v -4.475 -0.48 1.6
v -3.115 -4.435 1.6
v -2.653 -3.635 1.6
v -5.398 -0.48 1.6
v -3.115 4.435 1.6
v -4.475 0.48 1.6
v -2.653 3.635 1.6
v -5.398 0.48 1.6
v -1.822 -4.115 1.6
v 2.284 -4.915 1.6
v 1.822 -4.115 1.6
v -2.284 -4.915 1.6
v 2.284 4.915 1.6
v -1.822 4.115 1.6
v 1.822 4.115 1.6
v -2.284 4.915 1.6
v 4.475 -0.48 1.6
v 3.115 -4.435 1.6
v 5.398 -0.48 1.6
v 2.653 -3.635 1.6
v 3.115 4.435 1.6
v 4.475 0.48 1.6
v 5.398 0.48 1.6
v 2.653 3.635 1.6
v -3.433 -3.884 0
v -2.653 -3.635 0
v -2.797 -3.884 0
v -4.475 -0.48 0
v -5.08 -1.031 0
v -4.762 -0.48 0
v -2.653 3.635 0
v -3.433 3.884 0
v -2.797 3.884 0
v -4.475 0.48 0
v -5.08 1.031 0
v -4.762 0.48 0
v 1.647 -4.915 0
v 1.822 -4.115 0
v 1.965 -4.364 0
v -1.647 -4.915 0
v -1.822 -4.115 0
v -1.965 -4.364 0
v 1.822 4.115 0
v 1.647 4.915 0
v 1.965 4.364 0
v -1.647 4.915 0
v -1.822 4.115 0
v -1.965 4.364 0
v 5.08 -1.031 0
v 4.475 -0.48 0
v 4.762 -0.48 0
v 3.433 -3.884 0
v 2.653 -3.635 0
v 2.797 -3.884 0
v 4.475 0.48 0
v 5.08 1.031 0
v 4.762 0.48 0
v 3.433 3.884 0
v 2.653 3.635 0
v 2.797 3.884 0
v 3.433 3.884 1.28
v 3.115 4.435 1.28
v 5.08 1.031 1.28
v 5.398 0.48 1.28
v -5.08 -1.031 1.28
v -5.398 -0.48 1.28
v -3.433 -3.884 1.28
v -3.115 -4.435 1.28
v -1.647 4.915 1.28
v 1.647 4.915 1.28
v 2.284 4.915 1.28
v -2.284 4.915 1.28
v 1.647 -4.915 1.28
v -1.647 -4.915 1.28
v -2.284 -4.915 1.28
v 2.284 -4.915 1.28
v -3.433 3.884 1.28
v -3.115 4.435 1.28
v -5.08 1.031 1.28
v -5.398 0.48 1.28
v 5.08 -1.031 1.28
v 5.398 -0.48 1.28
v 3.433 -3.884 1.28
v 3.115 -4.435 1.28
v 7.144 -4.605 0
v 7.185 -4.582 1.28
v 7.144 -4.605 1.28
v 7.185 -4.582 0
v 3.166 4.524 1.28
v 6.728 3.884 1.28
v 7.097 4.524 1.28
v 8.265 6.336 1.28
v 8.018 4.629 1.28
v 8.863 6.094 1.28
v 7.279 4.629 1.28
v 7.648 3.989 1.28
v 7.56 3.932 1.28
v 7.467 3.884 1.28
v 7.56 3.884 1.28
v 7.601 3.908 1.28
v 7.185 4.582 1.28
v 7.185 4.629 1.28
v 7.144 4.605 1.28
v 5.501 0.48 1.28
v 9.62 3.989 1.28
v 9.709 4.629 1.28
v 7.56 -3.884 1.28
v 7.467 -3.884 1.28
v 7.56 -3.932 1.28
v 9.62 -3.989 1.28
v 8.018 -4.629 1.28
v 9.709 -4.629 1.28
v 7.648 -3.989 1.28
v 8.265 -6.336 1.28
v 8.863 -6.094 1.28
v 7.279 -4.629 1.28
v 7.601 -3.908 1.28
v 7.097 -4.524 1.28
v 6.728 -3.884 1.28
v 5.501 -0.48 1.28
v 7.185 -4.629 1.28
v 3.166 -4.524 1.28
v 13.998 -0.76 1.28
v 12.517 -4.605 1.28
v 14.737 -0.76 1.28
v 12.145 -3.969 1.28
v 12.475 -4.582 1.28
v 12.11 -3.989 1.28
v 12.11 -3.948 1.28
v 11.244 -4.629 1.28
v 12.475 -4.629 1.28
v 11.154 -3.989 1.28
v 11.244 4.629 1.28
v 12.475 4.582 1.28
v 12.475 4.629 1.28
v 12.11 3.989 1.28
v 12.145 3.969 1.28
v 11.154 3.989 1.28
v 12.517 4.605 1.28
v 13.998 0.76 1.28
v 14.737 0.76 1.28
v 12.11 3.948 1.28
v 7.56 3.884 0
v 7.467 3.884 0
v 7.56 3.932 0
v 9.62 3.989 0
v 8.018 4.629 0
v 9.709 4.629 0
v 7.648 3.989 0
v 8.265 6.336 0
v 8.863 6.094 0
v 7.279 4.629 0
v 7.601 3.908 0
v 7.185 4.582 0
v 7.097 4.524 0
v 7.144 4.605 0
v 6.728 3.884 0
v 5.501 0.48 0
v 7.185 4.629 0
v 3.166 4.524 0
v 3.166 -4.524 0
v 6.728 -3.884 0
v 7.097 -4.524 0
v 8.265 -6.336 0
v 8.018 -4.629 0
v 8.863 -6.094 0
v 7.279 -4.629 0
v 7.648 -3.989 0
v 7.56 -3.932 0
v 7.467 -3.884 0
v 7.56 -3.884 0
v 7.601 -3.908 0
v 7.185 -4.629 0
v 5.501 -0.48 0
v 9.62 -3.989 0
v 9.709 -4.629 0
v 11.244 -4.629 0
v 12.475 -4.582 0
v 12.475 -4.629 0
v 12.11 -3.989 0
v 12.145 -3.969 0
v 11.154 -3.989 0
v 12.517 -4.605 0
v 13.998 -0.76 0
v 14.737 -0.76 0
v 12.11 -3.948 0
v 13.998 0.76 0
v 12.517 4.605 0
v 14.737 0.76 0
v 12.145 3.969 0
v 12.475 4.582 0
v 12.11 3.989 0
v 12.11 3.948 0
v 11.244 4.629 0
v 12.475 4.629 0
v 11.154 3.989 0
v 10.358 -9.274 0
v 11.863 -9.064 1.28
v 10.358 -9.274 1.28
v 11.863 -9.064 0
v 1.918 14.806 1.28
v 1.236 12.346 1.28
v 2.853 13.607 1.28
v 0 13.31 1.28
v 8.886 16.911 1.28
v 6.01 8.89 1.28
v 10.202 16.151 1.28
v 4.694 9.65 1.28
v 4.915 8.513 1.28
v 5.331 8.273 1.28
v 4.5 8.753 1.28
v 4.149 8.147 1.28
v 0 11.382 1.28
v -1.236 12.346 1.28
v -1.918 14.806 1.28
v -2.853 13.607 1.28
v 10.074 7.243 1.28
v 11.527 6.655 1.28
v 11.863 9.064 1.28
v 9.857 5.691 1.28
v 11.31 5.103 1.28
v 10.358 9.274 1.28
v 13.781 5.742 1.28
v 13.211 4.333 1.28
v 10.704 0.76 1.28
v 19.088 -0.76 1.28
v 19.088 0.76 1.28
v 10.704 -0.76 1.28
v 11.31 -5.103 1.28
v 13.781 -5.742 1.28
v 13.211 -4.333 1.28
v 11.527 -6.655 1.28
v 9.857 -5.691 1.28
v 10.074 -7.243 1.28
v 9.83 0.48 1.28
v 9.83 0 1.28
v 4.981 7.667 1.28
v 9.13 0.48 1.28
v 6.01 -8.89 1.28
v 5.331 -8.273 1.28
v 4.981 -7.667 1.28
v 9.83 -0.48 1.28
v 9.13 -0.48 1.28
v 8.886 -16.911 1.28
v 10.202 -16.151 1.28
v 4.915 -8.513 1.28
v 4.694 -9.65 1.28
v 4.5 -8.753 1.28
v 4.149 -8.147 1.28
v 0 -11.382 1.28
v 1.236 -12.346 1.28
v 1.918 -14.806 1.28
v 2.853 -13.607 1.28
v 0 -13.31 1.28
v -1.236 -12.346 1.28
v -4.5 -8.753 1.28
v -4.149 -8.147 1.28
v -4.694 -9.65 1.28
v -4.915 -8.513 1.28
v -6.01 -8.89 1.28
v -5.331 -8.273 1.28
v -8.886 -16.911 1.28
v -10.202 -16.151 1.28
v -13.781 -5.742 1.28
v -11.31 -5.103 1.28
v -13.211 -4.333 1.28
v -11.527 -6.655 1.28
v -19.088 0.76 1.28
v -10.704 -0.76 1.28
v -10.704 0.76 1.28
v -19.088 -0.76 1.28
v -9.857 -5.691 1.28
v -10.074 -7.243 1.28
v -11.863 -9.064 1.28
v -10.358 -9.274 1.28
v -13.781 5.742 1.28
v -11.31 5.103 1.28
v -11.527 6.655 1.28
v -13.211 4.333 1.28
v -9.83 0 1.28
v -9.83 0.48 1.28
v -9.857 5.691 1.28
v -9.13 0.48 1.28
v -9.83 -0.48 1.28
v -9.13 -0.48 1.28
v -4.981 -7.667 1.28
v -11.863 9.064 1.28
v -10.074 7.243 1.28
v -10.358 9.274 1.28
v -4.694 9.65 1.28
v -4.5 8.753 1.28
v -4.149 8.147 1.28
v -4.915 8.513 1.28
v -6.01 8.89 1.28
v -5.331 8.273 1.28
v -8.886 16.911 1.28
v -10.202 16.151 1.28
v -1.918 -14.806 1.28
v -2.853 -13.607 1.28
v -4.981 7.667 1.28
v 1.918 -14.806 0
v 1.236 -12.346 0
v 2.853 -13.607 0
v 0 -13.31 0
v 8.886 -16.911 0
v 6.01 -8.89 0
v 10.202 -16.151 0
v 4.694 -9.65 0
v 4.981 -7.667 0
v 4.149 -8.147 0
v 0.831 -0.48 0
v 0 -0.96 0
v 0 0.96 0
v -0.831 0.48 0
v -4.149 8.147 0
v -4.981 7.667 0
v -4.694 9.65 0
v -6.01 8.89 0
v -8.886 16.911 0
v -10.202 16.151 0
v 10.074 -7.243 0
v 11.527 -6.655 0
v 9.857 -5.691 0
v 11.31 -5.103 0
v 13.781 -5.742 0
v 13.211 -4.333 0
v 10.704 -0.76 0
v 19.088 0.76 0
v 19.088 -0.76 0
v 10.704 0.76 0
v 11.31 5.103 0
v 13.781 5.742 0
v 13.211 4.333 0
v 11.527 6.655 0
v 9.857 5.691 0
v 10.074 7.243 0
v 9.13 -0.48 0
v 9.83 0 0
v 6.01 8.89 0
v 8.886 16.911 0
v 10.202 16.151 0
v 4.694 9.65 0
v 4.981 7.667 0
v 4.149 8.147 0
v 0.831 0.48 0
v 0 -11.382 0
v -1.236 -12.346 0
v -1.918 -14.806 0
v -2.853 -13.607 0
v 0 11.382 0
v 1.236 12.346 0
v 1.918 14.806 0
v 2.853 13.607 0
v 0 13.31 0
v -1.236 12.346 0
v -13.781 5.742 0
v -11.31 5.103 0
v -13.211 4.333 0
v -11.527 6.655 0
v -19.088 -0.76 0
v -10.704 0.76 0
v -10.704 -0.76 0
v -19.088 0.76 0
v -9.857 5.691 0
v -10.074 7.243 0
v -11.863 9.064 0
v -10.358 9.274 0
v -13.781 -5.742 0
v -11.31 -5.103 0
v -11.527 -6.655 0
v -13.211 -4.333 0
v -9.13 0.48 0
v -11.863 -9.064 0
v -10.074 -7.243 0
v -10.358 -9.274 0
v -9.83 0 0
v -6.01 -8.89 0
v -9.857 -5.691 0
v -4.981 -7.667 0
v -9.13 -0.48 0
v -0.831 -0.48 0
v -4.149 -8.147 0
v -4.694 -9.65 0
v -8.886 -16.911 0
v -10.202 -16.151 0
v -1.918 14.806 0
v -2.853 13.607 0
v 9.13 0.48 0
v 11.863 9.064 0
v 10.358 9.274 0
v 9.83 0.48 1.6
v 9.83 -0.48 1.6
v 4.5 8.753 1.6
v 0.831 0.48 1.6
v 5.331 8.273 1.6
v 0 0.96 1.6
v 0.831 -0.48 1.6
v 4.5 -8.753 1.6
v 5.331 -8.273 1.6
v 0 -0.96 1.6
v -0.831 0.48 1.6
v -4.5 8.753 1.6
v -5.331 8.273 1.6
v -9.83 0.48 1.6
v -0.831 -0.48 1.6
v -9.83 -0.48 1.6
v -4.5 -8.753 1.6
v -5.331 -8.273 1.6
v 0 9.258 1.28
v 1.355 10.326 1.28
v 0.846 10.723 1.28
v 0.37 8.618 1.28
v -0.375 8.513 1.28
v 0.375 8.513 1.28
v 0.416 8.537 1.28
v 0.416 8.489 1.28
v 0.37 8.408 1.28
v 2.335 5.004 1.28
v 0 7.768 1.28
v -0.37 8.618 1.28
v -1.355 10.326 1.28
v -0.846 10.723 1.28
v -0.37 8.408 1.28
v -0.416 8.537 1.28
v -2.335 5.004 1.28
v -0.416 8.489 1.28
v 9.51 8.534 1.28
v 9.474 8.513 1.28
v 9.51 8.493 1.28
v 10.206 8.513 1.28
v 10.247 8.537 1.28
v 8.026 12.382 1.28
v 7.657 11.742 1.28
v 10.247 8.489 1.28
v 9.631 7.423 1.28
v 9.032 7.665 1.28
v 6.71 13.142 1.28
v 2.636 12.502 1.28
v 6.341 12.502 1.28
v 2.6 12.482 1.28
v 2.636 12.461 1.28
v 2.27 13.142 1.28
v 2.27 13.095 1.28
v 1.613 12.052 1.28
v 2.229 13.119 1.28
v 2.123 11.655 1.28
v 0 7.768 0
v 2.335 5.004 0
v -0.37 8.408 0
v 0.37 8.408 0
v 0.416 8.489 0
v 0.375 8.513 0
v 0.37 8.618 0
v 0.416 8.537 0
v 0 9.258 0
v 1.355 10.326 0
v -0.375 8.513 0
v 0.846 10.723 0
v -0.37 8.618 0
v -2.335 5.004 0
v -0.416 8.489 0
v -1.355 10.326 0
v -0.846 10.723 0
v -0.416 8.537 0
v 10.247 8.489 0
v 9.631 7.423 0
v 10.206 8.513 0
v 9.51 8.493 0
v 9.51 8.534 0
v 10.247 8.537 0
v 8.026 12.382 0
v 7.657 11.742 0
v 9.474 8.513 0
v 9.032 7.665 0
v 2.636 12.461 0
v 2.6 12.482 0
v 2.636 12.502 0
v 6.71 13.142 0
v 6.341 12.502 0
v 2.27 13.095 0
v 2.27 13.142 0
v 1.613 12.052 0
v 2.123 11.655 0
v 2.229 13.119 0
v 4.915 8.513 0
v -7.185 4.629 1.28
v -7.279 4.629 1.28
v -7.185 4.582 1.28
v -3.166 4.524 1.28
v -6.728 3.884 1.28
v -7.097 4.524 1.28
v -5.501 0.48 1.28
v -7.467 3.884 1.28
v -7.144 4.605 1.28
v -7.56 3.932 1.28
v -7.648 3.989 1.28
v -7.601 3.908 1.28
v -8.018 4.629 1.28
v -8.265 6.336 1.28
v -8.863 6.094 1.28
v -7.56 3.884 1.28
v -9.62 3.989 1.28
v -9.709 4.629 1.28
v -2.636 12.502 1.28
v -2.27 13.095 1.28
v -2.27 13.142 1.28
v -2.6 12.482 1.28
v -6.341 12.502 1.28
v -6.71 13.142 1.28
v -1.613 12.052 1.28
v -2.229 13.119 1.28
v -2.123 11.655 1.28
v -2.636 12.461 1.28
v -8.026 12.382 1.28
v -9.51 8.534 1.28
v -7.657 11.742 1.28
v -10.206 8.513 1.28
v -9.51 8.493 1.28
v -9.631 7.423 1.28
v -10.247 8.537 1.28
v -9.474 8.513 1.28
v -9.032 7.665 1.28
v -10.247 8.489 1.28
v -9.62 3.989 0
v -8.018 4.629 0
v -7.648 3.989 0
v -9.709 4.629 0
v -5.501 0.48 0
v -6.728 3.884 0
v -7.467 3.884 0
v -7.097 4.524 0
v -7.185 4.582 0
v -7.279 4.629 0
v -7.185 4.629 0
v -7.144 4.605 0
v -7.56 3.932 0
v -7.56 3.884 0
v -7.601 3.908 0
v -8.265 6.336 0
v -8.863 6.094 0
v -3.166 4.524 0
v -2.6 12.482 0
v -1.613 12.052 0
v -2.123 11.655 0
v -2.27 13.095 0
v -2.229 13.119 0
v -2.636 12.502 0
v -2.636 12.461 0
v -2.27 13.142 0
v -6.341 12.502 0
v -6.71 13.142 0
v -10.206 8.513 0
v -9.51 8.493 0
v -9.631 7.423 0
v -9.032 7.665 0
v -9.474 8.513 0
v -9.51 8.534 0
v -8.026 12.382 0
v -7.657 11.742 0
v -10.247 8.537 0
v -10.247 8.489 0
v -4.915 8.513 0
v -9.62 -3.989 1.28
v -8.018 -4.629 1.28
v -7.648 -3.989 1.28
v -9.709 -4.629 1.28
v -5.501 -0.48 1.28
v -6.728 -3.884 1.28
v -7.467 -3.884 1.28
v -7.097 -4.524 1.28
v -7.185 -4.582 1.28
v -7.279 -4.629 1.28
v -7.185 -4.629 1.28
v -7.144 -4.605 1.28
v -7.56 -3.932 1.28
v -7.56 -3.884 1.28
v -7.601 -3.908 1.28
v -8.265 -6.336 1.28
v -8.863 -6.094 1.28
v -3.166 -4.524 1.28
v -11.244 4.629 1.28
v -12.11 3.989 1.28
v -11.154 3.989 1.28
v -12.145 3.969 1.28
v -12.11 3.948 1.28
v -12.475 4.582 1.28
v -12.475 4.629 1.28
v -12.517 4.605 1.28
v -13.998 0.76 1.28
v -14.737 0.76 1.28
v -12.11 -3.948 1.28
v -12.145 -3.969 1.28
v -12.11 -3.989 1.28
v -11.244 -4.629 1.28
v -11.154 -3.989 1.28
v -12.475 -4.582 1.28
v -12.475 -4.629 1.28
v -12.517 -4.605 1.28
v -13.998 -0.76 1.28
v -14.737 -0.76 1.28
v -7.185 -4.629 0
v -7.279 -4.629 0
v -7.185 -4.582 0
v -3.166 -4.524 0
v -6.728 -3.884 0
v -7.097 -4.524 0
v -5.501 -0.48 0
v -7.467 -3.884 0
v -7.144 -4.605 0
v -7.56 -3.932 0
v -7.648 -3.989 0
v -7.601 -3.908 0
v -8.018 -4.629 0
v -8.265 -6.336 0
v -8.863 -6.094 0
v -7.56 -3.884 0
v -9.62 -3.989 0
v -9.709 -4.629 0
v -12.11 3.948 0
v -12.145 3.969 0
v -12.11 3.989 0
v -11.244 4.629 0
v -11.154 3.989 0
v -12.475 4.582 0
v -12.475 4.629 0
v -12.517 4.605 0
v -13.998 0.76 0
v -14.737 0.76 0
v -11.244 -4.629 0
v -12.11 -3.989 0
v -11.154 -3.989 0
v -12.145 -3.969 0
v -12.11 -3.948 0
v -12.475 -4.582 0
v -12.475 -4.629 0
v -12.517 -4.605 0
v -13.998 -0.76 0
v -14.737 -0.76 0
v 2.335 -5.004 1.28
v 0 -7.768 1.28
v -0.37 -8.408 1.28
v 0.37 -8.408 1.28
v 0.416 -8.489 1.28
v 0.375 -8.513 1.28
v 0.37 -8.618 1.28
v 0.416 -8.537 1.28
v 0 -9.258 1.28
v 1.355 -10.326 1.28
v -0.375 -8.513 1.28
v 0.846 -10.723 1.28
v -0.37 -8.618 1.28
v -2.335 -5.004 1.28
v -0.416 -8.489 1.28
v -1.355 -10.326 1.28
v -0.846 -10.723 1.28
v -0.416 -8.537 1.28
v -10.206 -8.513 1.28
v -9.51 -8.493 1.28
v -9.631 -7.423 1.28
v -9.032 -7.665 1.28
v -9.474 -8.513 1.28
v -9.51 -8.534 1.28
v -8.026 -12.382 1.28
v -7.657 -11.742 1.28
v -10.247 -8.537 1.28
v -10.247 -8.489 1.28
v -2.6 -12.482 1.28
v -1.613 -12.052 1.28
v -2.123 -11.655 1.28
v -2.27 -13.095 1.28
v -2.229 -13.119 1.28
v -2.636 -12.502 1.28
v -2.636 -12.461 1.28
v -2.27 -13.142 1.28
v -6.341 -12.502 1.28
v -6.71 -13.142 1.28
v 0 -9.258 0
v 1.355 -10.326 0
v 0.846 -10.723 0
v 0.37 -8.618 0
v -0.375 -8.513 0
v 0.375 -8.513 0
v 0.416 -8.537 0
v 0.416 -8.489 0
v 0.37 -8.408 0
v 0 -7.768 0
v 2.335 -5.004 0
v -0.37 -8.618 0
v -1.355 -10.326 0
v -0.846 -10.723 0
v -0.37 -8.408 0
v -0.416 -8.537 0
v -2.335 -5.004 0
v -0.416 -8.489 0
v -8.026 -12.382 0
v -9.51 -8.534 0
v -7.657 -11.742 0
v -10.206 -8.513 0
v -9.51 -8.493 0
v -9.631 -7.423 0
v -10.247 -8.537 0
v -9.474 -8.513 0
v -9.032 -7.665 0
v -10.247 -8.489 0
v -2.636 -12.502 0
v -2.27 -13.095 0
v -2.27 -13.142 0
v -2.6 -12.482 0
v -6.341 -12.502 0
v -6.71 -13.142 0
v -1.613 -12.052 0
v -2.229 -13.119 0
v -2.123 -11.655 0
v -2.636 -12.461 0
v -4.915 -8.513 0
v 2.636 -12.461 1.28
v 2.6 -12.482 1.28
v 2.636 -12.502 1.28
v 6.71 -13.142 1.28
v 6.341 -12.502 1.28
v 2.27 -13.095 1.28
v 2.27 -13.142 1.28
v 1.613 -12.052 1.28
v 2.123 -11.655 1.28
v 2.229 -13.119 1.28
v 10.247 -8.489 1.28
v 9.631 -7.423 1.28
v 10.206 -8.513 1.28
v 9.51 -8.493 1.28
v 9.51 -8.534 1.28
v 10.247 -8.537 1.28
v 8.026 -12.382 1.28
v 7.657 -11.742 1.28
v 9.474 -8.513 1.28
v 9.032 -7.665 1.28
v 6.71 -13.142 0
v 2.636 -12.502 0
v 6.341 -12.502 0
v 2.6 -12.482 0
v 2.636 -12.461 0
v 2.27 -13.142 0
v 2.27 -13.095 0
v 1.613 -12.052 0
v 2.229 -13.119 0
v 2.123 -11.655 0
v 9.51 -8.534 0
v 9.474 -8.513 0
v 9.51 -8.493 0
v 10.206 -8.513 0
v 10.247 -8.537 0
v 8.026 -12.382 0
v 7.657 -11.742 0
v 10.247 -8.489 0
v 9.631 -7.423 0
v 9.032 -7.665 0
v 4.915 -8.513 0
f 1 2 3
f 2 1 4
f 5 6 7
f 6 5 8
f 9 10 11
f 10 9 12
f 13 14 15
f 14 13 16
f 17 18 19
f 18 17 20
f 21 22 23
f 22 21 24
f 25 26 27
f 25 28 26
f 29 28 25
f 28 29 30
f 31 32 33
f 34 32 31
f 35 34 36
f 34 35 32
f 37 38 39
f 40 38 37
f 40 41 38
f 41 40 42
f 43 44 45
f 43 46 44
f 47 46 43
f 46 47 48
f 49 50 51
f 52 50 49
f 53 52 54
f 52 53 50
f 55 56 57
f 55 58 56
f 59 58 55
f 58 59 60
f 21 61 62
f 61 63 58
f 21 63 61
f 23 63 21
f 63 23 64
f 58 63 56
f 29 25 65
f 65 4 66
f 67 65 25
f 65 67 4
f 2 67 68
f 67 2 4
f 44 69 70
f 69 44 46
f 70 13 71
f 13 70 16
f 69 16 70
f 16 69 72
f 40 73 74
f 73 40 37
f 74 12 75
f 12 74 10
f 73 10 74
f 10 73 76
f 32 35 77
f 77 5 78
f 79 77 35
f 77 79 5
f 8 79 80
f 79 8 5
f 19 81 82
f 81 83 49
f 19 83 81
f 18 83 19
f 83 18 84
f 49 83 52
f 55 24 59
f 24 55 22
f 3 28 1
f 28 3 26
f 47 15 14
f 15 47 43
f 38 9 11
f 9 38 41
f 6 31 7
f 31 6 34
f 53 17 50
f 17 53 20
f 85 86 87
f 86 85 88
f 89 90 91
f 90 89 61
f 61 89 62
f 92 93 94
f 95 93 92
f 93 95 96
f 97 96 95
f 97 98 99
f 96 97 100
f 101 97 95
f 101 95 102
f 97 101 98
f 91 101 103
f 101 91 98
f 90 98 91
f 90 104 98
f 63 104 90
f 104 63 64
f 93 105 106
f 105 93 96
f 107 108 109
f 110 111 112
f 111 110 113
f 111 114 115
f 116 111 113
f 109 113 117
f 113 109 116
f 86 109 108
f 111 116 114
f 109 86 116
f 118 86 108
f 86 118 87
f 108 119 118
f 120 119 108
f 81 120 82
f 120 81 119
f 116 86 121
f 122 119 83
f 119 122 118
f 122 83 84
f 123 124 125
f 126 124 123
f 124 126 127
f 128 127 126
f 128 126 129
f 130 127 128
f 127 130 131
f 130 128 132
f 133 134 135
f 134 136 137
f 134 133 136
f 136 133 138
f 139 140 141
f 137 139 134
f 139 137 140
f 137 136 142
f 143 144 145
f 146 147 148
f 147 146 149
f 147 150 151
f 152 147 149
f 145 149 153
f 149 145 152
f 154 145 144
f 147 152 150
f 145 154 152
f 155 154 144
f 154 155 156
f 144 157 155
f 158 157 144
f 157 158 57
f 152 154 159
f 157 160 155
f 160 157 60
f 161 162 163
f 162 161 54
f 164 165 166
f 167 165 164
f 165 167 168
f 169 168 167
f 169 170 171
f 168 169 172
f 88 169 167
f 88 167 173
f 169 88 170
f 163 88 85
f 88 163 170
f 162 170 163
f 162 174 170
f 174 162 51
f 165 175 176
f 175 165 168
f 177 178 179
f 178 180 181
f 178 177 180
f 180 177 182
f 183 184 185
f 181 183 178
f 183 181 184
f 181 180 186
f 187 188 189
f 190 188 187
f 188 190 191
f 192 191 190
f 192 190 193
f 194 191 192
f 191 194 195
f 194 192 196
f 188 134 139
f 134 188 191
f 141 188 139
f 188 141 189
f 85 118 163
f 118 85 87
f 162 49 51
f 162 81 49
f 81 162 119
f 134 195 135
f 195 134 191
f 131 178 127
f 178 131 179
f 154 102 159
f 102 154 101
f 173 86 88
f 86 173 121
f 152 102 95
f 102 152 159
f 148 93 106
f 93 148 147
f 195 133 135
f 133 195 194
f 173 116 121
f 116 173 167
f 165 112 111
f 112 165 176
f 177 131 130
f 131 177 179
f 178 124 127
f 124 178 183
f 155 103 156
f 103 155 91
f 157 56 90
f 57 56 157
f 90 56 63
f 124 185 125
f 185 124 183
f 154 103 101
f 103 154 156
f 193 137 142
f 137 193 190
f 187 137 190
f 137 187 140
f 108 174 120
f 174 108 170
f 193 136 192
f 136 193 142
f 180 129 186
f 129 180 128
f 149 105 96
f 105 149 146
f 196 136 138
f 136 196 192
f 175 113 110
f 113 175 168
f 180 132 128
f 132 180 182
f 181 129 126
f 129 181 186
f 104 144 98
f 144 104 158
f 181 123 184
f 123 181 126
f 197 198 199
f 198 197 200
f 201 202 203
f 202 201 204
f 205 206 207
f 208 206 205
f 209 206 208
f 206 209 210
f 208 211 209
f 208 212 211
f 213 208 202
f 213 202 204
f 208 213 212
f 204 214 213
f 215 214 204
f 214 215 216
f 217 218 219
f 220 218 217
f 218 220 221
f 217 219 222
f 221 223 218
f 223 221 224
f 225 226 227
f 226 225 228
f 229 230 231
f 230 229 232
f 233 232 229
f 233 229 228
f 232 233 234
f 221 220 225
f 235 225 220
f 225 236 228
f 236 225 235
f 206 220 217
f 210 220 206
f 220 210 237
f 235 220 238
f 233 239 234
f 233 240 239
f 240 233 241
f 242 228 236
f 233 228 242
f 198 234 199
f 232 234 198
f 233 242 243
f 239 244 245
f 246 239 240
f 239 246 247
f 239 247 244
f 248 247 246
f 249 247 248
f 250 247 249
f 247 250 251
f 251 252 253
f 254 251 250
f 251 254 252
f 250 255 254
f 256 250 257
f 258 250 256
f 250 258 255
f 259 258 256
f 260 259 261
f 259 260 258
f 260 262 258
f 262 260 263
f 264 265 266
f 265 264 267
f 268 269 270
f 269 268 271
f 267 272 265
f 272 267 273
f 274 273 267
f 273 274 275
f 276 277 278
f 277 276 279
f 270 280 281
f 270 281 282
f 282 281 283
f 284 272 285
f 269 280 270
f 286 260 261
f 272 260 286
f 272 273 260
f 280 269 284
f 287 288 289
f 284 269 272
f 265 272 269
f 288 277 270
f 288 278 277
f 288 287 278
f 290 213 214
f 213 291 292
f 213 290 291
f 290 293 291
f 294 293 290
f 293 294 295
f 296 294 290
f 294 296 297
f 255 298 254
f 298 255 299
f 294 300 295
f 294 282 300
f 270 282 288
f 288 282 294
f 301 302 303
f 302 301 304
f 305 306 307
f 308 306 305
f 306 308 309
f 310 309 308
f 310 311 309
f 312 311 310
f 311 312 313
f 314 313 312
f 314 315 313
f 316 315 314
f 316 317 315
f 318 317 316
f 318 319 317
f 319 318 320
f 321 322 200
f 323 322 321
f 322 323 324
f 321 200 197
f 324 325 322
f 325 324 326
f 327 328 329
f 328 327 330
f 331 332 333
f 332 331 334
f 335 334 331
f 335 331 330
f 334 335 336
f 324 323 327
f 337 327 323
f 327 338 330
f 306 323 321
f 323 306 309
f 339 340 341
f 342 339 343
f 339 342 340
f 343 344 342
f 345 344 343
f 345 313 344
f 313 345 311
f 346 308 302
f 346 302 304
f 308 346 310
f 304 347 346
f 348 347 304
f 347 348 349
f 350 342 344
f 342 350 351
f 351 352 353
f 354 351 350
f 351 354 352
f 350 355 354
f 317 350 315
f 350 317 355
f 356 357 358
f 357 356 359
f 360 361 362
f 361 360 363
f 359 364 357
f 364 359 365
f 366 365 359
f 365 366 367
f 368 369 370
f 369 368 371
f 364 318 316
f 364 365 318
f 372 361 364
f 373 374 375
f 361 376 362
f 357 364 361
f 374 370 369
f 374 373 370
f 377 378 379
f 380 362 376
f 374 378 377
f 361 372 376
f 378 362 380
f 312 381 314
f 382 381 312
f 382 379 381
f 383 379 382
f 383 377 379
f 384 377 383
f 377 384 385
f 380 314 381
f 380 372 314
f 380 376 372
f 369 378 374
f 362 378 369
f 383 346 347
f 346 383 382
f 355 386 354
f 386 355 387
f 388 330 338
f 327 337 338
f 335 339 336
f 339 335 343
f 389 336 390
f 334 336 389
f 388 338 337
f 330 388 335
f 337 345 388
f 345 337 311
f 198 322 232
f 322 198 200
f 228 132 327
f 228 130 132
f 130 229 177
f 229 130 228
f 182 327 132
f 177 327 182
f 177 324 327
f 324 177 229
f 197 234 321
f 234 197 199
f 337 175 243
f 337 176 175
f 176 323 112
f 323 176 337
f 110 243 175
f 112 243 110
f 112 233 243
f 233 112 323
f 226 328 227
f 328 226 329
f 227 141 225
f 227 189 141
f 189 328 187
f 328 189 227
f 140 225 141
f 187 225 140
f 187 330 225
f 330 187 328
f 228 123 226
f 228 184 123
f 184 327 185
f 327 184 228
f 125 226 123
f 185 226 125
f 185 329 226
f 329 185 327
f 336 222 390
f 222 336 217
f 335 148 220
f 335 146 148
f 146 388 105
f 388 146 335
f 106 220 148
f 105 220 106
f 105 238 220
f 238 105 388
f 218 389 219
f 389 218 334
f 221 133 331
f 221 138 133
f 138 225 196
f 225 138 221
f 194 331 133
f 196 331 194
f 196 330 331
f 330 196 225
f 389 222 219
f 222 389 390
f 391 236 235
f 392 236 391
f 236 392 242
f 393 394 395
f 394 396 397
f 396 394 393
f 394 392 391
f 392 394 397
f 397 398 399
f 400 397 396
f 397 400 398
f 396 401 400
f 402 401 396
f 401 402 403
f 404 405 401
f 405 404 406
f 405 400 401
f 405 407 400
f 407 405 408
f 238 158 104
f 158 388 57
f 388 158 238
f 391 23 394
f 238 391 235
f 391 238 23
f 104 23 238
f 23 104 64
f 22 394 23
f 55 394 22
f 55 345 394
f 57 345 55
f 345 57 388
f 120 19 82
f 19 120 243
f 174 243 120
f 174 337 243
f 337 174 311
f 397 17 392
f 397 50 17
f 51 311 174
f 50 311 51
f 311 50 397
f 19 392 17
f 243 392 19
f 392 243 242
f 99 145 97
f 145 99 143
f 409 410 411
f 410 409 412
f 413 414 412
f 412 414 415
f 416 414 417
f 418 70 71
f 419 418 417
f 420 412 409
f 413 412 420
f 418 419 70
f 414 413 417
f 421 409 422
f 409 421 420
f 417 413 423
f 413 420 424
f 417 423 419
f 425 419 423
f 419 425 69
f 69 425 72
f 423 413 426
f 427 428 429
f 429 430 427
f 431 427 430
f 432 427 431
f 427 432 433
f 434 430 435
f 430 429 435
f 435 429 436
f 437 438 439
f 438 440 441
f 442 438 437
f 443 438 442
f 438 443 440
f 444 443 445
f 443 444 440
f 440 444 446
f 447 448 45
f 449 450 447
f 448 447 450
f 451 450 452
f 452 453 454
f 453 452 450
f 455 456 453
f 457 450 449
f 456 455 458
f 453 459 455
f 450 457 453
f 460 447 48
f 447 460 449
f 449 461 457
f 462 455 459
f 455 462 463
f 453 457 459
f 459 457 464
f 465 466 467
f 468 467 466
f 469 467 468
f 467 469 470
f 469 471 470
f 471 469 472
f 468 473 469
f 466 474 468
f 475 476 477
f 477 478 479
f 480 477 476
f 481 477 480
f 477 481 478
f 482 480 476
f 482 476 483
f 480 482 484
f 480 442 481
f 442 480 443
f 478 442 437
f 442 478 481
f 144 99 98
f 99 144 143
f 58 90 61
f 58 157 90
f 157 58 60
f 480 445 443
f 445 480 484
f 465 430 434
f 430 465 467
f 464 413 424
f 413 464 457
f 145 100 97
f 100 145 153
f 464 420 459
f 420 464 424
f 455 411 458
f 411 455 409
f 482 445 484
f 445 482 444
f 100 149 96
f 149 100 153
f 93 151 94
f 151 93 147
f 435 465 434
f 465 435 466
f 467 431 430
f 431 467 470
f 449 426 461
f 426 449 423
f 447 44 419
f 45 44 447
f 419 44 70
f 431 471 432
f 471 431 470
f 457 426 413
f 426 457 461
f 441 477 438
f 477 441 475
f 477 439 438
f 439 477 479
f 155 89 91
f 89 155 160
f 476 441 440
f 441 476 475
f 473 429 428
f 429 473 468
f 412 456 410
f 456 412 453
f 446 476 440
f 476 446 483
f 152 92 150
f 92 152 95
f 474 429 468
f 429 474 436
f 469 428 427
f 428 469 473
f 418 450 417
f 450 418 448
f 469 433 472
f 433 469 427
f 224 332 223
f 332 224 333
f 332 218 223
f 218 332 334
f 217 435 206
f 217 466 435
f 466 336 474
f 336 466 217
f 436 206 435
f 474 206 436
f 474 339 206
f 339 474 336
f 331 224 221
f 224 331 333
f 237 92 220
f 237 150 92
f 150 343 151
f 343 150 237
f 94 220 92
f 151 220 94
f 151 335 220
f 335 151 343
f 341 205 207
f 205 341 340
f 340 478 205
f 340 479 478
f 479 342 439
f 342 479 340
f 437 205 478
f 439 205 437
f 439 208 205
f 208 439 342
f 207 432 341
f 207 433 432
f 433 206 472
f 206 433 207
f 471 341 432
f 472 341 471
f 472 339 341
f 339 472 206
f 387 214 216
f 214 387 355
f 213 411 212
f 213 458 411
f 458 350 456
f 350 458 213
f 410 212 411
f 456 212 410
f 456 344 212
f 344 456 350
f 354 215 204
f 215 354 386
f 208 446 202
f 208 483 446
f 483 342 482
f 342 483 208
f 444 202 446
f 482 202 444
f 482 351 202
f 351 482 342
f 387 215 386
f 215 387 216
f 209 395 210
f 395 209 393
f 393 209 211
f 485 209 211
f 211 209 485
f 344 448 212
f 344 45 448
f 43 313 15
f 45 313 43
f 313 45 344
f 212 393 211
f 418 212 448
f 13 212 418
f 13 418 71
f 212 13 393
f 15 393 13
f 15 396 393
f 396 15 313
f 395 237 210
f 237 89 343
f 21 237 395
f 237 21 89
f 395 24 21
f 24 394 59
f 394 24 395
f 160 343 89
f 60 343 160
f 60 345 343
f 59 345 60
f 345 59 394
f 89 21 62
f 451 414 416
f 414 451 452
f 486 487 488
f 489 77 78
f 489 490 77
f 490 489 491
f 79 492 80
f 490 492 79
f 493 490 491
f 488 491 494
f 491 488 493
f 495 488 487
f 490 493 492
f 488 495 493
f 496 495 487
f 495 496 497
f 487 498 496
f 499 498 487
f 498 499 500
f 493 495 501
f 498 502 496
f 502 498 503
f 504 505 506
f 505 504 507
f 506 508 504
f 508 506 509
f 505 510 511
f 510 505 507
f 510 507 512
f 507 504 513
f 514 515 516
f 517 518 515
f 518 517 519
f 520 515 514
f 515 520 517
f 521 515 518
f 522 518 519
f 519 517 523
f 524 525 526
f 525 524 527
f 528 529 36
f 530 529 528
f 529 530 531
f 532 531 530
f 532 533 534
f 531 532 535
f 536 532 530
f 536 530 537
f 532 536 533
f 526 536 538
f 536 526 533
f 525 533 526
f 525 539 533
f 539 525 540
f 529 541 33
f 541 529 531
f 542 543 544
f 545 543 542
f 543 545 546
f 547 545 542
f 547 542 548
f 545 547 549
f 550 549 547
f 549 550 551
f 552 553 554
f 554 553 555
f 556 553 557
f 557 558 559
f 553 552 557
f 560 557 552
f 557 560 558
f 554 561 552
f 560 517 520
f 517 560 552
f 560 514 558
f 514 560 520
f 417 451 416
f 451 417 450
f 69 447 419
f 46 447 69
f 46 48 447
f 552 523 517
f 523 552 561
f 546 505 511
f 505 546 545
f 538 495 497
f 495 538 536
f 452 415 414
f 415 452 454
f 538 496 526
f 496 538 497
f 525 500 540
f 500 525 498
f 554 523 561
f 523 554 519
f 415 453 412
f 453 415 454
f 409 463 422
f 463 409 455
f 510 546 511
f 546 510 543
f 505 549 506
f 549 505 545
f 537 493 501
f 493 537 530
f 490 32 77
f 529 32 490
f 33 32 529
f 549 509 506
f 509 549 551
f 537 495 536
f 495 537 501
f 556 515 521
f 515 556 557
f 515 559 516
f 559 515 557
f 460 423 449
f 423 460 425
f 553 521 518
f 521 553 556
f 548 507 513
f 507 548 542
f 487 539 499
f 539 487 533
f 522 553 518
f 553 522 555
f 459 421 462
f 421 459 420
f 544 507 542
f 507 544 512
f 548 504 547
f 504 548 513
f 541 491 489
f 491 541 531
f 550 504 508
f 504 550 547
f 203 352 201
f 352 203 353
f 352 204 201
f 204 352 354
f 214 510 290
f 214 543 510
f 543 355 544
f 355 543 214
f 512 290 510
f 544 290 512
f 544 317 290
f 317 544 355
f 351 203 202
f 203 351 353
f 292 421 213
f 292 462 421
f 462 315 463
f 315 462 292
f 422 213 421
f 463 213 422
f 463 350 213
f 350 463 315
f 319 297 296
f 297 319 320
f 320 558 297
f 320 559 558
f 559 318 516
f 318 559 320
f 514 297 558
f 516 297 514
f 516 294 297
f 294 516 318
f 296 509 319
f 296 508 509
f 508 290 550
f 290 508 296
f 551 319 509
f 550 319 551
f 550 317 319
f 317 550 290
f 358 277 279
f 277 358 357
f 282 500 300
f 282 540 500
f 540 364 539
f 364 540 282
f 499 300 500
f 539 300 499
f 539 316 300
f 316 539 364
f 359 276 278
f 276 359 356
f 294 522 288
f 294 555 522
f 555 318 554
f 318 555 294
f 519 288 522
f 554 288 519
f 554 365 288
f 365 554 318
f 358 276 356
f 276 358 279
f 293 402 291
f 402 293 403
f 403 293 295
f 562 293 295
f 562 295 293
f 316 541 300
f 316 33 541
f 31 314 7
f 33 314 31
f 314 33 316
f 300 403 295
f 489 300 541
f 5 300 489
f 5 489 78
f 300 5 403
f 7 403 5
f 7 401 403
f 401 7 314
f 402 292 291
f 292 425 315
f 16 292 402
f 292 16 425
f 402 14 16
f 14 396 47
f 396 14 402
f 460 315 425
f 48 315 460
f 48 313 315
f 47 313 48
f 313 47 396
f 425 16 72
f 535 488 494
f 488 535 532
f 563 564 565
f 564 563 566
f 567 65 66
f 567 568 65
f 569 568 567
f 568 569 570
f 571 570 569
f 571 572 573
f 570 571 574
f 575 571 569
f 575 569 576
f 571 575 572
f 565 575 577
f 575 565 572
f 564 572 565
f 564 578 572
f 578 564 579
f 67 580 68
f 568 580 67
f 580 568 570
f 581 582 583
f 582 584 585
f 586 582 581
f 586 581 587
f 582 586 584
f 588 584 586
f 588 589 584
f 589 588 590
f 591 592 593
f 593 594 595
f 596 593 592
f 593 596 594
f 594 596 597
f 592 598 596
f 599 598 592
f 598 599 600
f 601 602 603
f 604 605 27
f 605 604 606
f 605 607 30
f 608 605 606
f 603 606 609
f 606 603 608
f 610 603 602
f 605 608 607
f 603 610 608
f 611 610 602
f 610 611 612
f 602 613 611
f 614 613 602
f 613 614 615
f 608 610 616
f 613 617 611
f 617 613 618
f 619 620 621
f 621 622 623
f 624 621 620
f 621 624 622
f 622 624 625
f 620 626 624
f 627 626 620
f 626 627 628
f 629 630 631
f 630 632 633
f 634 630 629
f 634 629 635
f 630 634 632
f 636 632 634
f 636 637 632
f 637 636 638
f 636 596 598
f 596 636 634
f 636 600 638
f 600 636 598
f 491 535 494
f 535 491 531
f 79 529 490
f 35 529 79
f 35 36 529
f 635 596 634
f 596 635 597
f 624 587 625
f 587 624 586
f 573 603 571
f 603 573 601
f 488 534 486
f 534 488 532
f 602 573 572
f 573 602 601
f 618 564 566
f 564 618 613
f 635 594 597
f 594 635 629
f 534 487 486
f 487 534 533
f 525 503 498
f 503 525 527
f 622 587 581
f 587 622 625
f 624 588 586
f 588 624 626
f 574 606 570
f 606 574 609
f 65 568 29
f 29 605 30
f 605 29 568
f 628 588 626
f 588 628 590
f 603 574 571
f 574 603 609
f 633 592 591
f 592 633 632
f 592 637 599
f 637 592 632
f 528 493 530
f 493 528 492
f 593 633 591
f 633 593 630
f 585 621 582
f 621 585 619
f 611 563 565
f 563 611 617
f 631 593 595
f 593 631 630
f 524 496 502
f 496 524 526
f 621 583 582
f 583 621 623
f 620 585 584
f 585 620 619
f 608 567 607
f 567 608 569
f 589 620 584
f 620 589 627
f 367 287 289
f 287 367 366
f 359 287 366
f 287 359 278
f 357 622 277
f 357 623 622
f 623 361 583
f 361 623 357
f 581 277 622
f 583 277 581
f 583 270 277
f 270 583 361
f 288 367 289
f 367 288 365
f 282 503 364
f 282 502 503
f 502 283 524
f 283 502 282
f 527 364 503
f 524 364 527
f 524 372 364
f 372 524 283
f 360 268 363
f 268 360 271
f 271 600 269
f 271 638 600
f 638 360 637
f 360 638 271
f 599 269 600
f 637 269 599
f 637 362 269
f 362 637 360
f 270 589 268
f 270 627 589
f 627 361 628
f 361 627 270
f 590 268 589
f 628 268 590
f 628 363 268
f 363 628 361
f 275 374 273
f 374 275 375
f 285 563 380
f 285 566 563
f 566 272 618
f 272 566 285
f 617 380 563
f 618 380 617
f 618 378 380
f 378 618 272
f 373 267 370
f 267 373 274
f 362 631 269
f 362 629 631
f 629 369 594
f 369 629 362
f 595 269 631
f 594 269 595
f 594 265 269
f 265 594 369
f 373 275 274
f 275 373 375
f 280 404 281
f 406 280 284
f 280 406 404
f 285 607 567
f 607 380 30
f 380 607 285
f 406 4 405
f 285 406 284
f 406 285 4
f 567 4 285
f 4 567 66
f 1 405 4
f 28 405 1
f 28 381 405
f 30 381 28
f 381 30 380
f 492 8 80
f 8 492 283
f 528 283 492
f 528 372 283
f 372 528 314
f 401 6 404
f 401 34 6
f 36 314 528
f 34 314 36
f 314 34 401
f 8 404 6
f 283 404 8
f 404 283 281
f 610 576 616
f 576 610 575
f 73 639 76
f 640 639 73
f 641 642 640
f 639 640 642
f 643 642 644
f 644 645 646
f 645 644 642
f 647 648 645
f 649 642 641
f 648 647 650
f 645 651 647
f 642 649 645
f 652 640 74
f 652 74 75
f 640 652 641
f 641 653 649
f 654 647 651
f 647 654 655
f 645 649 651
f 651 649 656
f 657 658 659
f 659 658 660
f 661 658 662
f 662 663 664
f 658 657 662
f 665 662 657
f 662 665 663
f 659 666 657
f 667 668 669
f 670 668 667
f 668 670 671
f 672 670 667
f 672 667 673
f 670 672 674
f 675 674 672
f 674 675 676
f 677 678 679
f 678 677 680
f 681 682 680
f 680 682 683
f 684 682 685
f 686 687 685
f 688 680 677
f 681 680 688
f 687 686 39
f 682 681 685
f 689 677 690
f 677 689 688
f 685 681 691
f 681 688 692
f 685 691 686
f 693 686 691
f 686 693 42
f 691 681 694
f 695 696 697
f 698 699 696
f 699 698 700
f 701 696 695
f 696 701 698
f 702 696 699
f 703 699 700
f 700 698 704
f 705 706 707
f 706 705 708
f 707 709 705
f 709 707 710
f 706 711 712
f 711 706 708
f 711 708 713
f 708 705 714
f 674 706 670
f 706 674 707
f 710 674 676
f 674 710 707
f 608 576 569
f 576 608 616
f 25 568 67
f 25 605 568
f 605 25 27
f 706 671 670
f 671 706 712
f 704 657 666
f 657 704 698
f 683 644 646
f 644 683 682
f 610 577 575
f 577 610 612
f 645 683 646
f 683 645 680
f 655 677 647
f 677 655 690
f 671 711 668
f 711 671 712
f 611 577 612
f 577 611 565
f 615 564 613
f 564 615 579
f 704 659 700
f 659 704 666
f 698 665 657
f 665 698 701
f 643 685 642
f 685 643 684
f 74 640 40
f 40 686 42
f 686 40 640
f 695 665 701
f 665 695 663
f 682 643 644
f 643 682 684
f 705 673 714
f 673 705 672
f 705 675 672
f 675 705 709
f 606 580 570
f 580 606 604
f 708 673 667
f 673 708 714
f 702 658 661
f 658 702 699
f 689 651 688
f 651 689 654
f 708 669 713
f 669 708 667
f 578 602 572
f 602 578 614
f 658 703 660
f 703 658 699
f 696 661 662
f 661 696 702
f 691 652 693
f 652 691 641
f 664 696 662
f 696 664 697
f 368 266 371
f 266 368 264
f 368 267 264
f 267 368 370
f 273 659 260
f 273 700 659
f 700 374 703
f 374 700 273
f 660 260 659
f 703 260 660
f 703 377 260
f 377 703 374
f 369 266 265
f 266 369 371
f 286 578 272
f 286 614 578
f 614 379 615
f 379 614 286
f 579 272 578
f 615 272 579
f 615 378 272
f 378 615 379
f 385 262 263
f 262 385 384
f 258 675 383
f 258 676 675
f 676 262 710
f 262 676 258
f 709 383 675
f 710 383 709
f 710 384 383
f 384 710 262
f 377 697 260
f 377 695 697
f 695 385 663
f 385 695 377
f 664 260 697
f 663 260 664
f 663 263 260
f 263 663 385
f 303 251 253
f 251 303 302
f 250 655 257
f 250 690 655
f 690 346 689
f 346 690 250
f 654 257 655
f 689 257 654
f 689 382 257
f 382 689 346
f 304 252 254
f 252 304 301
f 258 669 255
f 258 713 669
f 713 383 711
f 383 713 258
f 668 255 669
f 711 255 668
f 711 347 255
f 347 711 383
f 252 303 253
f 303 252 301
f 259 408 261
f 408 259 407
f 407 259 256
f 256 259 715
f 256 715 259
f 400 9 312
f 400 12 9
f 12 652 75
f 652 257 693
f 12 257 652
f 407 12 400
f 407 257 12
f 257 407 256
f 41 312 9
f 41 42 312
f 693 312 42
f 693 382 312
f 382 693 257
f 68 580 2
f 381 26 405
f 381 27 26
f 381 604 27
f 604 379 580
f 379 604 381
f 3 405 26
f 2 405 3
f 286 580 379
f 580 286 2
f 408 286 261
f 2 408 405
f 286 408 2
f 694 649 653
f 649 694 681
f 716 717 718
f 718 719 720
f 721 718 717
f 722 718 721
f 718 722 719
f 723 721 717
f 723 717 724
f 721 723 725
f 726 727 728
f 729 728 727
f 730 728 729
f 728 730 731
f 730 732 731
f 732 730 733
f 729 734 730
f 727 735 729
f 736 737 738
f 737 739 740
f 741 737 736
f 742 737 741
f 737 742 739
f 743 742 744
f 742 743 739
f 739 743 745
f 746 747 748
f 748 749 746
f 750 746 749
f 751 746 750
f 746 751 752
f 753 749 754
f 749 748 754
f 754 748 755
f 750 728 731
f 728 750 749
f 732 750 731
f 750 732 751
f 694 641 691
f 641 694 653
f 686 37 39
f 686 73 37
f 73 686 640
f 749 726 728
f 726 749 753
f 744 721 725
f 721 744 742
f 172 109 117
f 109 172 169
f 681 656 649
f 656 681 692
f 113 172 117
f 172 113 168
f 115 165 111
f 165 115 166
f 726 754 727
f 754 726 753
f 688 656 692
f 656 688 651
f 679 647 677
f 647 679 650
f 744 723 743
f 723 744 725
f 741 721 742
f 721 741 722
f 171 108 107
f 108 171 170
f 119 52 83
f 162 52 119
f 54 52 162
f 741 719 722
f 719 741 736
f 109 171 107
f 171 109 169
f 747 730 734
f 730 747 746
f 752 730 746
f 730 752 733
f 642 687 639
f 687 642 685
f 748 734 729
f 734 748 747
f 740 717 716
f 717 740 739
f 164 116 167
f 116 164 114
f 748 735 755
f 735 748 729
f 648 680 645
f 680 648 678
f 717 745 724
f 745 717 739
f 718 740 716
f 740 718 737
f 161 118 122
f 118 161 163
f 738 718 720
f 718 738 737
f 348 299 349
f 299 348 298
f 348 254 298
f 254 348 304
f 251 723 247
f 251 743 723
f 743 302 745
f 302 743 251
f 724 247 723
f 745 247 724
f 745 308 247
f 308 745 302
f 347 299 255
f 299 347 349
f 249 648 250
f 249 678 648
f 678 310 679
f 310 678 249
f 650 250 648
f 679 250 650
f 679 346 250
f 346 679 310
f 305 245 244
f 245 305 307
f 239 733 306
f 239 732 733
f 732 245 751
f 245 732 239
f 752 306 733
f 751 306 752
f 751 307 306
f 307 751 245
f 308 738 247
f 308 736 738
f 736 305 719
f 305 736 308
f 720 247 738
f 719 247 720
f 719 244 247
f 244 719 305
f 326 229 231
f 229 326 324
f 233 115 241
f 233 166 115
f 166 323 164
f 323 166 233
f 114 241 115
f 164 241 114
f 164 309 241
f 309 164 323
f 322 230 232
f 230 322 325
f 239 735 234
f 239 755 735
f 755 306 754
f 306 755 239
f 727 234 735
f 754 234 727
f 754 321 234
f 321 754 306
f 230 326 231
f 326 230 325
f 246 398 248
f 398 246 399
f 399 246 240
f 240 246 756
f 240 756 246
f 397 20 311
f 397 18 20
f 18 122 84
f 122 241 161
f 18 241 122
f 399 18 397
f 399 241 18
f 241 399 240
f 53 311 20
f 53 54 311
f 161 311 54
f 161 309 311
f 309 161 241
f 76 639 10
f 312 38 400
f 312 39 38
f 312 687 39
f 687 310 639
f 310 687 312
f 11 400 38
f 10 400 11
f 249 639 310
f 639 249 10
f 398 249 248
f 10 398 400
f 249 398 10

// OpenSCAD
// Parametric Snowflakes
// (c) 2012 Laird Popkin

// Randomly generate snowflakes. The basic approach is to draw six
// radial arms out from the center, then recursively draw arms out from 
// the ands of the first arms, and so on. For a random number of
// layers of recursion. Also, randomly draw hexagons.

// Arrays of parameters. Foo[0] is center, [1] is first layer out, [2] is
// second layer, etc.

// Snowflake number
seed=1; //[0:1000000]
echo(str("Seed ",seed));

seeds=rands(0,1000000,7,seed);
echo(str("Seeds ",seeds));

hex = rands(0,1,6,seeds[0]);			// Should this layer have hexagons? >0.5 = yes.
echo("hex ",hex);
hsolid = rands(0,1,6,seeds[1]);		// should hexagons be solid? >0.5 = yes.
echo("hex solid ",hsolid); 
hhex = rands(0,1,6,seeds[2]);			// Should there be an inner hexagon? >0.5 = yes.
echo("hhex ",hhex);
length = rands(5,20,6,seeds[3]);		// length of lines for this layer
echo("length ",length);
width = rands(0.2,2,6,seeds[4]);		// width of lines for this layer
echo("width ",width);
angle = rands(60,120,6,seeds[5]);	// angle for arms for next layer
echo("angle ",angle);

depth = rands(1,4,1,,seeds[6])[0];	// number of layers to draw.
echo("depth ",depth);

scaleh=0.8 * 1;						// each layer is 0.9x previous layer height
// Height
height0=2 * 1;						// height of snowflake in mm
height=[height0,height0*scaleh,height0*pow(scaleh,2), height0*pow(scaleh,3), height0*pow(scaleh,4), height0*pow(scaleh,5), height0*pow(scaleh,6)];
//echo("height ",height);


if (hex[0]) drawhex(length[1], height[1], hsolid[1]);

for (angle1 = [0 : 60 : 359]) {	// then six radial arms
	rotate(angle1)arm();
	}

module arm() {
	translate ([0,-width[1]/2,0]) {
		cube([length[1],width[1],height[1]]);
		translate ([length[1],width[1]/2,0]) {
			if (hex[1]>.5) drawhex(length[2], height[2], hsolid[2]);
			if (hhex[1]>.5) drawhex(length[2]/2, height[2], hsolid[2]);
			if (depth>1) {
				rotate(-angle[1]) arm2();
				arm2();
				rotate(angle[1]) arm2();
				}
			}
		}
	}

module arm2() {
	translate ([0,-width[2]/2,0]) {
		cube([length[2],width[2],height[2]]);
		translate ([length[2],width[2]/2,0]) {
			if (hex[2]>.5) drawhex(length[3], height[3], hsolid[3]);
			if (hhex[2]>.5) drawhex(length[3]/2, height[3], hsolid[3]);
			if (depth>2) {
				rotate(-angle[2]) arm3();
				arm3();
				rotate(angle[2]) arm3();
				}
			}
		}
	}

module arm3() {
	translate ([0,-width[3]/2,0]) {
		cube([length[3],width[3],height[3]]);
		translate ([length[3],width[3]/2,0]) {
			if (hex[3]>.5) drawhex(length[4], height[4], hsolid[4]);
			if (hhex[3]>.5) drawhex(length[4]/2, height[4], hsolid[4]);
			if (depth>3) {
				rotate(-angle[3]) arm4();
				arm4();
				rotate(angle[3]) arm4();
				}
			}
		}
	}

module arm4() {
	translate ([0,-width[4]/2,0]) {
		cube([length[4],width[4],height[4]]);
		translate ([length[4],width[4]/2,0]) {
			if (hex[4]>.5) drawhex(length[5], height[5]);
			if (hhex[4]>.5) drawhex(length[5]/2, height[5]);
			}
		}
	}

module drawhex(size, height, s) {
	translate([0,0,height/2]) difference() {
		hexagon(size, height);
		if (s>0.5) translate([0,0,-0.5]) hexagon(size-height, height+1);
		}
	}

// size is the XY plane size, height in Z
module hexagon(size, height) {
	boxWidth = size/1.75;
	for (r = [-60, 0, 60]) rotate([0,0,r]) 
		cube([boxWidth, size, height], true);
	}
